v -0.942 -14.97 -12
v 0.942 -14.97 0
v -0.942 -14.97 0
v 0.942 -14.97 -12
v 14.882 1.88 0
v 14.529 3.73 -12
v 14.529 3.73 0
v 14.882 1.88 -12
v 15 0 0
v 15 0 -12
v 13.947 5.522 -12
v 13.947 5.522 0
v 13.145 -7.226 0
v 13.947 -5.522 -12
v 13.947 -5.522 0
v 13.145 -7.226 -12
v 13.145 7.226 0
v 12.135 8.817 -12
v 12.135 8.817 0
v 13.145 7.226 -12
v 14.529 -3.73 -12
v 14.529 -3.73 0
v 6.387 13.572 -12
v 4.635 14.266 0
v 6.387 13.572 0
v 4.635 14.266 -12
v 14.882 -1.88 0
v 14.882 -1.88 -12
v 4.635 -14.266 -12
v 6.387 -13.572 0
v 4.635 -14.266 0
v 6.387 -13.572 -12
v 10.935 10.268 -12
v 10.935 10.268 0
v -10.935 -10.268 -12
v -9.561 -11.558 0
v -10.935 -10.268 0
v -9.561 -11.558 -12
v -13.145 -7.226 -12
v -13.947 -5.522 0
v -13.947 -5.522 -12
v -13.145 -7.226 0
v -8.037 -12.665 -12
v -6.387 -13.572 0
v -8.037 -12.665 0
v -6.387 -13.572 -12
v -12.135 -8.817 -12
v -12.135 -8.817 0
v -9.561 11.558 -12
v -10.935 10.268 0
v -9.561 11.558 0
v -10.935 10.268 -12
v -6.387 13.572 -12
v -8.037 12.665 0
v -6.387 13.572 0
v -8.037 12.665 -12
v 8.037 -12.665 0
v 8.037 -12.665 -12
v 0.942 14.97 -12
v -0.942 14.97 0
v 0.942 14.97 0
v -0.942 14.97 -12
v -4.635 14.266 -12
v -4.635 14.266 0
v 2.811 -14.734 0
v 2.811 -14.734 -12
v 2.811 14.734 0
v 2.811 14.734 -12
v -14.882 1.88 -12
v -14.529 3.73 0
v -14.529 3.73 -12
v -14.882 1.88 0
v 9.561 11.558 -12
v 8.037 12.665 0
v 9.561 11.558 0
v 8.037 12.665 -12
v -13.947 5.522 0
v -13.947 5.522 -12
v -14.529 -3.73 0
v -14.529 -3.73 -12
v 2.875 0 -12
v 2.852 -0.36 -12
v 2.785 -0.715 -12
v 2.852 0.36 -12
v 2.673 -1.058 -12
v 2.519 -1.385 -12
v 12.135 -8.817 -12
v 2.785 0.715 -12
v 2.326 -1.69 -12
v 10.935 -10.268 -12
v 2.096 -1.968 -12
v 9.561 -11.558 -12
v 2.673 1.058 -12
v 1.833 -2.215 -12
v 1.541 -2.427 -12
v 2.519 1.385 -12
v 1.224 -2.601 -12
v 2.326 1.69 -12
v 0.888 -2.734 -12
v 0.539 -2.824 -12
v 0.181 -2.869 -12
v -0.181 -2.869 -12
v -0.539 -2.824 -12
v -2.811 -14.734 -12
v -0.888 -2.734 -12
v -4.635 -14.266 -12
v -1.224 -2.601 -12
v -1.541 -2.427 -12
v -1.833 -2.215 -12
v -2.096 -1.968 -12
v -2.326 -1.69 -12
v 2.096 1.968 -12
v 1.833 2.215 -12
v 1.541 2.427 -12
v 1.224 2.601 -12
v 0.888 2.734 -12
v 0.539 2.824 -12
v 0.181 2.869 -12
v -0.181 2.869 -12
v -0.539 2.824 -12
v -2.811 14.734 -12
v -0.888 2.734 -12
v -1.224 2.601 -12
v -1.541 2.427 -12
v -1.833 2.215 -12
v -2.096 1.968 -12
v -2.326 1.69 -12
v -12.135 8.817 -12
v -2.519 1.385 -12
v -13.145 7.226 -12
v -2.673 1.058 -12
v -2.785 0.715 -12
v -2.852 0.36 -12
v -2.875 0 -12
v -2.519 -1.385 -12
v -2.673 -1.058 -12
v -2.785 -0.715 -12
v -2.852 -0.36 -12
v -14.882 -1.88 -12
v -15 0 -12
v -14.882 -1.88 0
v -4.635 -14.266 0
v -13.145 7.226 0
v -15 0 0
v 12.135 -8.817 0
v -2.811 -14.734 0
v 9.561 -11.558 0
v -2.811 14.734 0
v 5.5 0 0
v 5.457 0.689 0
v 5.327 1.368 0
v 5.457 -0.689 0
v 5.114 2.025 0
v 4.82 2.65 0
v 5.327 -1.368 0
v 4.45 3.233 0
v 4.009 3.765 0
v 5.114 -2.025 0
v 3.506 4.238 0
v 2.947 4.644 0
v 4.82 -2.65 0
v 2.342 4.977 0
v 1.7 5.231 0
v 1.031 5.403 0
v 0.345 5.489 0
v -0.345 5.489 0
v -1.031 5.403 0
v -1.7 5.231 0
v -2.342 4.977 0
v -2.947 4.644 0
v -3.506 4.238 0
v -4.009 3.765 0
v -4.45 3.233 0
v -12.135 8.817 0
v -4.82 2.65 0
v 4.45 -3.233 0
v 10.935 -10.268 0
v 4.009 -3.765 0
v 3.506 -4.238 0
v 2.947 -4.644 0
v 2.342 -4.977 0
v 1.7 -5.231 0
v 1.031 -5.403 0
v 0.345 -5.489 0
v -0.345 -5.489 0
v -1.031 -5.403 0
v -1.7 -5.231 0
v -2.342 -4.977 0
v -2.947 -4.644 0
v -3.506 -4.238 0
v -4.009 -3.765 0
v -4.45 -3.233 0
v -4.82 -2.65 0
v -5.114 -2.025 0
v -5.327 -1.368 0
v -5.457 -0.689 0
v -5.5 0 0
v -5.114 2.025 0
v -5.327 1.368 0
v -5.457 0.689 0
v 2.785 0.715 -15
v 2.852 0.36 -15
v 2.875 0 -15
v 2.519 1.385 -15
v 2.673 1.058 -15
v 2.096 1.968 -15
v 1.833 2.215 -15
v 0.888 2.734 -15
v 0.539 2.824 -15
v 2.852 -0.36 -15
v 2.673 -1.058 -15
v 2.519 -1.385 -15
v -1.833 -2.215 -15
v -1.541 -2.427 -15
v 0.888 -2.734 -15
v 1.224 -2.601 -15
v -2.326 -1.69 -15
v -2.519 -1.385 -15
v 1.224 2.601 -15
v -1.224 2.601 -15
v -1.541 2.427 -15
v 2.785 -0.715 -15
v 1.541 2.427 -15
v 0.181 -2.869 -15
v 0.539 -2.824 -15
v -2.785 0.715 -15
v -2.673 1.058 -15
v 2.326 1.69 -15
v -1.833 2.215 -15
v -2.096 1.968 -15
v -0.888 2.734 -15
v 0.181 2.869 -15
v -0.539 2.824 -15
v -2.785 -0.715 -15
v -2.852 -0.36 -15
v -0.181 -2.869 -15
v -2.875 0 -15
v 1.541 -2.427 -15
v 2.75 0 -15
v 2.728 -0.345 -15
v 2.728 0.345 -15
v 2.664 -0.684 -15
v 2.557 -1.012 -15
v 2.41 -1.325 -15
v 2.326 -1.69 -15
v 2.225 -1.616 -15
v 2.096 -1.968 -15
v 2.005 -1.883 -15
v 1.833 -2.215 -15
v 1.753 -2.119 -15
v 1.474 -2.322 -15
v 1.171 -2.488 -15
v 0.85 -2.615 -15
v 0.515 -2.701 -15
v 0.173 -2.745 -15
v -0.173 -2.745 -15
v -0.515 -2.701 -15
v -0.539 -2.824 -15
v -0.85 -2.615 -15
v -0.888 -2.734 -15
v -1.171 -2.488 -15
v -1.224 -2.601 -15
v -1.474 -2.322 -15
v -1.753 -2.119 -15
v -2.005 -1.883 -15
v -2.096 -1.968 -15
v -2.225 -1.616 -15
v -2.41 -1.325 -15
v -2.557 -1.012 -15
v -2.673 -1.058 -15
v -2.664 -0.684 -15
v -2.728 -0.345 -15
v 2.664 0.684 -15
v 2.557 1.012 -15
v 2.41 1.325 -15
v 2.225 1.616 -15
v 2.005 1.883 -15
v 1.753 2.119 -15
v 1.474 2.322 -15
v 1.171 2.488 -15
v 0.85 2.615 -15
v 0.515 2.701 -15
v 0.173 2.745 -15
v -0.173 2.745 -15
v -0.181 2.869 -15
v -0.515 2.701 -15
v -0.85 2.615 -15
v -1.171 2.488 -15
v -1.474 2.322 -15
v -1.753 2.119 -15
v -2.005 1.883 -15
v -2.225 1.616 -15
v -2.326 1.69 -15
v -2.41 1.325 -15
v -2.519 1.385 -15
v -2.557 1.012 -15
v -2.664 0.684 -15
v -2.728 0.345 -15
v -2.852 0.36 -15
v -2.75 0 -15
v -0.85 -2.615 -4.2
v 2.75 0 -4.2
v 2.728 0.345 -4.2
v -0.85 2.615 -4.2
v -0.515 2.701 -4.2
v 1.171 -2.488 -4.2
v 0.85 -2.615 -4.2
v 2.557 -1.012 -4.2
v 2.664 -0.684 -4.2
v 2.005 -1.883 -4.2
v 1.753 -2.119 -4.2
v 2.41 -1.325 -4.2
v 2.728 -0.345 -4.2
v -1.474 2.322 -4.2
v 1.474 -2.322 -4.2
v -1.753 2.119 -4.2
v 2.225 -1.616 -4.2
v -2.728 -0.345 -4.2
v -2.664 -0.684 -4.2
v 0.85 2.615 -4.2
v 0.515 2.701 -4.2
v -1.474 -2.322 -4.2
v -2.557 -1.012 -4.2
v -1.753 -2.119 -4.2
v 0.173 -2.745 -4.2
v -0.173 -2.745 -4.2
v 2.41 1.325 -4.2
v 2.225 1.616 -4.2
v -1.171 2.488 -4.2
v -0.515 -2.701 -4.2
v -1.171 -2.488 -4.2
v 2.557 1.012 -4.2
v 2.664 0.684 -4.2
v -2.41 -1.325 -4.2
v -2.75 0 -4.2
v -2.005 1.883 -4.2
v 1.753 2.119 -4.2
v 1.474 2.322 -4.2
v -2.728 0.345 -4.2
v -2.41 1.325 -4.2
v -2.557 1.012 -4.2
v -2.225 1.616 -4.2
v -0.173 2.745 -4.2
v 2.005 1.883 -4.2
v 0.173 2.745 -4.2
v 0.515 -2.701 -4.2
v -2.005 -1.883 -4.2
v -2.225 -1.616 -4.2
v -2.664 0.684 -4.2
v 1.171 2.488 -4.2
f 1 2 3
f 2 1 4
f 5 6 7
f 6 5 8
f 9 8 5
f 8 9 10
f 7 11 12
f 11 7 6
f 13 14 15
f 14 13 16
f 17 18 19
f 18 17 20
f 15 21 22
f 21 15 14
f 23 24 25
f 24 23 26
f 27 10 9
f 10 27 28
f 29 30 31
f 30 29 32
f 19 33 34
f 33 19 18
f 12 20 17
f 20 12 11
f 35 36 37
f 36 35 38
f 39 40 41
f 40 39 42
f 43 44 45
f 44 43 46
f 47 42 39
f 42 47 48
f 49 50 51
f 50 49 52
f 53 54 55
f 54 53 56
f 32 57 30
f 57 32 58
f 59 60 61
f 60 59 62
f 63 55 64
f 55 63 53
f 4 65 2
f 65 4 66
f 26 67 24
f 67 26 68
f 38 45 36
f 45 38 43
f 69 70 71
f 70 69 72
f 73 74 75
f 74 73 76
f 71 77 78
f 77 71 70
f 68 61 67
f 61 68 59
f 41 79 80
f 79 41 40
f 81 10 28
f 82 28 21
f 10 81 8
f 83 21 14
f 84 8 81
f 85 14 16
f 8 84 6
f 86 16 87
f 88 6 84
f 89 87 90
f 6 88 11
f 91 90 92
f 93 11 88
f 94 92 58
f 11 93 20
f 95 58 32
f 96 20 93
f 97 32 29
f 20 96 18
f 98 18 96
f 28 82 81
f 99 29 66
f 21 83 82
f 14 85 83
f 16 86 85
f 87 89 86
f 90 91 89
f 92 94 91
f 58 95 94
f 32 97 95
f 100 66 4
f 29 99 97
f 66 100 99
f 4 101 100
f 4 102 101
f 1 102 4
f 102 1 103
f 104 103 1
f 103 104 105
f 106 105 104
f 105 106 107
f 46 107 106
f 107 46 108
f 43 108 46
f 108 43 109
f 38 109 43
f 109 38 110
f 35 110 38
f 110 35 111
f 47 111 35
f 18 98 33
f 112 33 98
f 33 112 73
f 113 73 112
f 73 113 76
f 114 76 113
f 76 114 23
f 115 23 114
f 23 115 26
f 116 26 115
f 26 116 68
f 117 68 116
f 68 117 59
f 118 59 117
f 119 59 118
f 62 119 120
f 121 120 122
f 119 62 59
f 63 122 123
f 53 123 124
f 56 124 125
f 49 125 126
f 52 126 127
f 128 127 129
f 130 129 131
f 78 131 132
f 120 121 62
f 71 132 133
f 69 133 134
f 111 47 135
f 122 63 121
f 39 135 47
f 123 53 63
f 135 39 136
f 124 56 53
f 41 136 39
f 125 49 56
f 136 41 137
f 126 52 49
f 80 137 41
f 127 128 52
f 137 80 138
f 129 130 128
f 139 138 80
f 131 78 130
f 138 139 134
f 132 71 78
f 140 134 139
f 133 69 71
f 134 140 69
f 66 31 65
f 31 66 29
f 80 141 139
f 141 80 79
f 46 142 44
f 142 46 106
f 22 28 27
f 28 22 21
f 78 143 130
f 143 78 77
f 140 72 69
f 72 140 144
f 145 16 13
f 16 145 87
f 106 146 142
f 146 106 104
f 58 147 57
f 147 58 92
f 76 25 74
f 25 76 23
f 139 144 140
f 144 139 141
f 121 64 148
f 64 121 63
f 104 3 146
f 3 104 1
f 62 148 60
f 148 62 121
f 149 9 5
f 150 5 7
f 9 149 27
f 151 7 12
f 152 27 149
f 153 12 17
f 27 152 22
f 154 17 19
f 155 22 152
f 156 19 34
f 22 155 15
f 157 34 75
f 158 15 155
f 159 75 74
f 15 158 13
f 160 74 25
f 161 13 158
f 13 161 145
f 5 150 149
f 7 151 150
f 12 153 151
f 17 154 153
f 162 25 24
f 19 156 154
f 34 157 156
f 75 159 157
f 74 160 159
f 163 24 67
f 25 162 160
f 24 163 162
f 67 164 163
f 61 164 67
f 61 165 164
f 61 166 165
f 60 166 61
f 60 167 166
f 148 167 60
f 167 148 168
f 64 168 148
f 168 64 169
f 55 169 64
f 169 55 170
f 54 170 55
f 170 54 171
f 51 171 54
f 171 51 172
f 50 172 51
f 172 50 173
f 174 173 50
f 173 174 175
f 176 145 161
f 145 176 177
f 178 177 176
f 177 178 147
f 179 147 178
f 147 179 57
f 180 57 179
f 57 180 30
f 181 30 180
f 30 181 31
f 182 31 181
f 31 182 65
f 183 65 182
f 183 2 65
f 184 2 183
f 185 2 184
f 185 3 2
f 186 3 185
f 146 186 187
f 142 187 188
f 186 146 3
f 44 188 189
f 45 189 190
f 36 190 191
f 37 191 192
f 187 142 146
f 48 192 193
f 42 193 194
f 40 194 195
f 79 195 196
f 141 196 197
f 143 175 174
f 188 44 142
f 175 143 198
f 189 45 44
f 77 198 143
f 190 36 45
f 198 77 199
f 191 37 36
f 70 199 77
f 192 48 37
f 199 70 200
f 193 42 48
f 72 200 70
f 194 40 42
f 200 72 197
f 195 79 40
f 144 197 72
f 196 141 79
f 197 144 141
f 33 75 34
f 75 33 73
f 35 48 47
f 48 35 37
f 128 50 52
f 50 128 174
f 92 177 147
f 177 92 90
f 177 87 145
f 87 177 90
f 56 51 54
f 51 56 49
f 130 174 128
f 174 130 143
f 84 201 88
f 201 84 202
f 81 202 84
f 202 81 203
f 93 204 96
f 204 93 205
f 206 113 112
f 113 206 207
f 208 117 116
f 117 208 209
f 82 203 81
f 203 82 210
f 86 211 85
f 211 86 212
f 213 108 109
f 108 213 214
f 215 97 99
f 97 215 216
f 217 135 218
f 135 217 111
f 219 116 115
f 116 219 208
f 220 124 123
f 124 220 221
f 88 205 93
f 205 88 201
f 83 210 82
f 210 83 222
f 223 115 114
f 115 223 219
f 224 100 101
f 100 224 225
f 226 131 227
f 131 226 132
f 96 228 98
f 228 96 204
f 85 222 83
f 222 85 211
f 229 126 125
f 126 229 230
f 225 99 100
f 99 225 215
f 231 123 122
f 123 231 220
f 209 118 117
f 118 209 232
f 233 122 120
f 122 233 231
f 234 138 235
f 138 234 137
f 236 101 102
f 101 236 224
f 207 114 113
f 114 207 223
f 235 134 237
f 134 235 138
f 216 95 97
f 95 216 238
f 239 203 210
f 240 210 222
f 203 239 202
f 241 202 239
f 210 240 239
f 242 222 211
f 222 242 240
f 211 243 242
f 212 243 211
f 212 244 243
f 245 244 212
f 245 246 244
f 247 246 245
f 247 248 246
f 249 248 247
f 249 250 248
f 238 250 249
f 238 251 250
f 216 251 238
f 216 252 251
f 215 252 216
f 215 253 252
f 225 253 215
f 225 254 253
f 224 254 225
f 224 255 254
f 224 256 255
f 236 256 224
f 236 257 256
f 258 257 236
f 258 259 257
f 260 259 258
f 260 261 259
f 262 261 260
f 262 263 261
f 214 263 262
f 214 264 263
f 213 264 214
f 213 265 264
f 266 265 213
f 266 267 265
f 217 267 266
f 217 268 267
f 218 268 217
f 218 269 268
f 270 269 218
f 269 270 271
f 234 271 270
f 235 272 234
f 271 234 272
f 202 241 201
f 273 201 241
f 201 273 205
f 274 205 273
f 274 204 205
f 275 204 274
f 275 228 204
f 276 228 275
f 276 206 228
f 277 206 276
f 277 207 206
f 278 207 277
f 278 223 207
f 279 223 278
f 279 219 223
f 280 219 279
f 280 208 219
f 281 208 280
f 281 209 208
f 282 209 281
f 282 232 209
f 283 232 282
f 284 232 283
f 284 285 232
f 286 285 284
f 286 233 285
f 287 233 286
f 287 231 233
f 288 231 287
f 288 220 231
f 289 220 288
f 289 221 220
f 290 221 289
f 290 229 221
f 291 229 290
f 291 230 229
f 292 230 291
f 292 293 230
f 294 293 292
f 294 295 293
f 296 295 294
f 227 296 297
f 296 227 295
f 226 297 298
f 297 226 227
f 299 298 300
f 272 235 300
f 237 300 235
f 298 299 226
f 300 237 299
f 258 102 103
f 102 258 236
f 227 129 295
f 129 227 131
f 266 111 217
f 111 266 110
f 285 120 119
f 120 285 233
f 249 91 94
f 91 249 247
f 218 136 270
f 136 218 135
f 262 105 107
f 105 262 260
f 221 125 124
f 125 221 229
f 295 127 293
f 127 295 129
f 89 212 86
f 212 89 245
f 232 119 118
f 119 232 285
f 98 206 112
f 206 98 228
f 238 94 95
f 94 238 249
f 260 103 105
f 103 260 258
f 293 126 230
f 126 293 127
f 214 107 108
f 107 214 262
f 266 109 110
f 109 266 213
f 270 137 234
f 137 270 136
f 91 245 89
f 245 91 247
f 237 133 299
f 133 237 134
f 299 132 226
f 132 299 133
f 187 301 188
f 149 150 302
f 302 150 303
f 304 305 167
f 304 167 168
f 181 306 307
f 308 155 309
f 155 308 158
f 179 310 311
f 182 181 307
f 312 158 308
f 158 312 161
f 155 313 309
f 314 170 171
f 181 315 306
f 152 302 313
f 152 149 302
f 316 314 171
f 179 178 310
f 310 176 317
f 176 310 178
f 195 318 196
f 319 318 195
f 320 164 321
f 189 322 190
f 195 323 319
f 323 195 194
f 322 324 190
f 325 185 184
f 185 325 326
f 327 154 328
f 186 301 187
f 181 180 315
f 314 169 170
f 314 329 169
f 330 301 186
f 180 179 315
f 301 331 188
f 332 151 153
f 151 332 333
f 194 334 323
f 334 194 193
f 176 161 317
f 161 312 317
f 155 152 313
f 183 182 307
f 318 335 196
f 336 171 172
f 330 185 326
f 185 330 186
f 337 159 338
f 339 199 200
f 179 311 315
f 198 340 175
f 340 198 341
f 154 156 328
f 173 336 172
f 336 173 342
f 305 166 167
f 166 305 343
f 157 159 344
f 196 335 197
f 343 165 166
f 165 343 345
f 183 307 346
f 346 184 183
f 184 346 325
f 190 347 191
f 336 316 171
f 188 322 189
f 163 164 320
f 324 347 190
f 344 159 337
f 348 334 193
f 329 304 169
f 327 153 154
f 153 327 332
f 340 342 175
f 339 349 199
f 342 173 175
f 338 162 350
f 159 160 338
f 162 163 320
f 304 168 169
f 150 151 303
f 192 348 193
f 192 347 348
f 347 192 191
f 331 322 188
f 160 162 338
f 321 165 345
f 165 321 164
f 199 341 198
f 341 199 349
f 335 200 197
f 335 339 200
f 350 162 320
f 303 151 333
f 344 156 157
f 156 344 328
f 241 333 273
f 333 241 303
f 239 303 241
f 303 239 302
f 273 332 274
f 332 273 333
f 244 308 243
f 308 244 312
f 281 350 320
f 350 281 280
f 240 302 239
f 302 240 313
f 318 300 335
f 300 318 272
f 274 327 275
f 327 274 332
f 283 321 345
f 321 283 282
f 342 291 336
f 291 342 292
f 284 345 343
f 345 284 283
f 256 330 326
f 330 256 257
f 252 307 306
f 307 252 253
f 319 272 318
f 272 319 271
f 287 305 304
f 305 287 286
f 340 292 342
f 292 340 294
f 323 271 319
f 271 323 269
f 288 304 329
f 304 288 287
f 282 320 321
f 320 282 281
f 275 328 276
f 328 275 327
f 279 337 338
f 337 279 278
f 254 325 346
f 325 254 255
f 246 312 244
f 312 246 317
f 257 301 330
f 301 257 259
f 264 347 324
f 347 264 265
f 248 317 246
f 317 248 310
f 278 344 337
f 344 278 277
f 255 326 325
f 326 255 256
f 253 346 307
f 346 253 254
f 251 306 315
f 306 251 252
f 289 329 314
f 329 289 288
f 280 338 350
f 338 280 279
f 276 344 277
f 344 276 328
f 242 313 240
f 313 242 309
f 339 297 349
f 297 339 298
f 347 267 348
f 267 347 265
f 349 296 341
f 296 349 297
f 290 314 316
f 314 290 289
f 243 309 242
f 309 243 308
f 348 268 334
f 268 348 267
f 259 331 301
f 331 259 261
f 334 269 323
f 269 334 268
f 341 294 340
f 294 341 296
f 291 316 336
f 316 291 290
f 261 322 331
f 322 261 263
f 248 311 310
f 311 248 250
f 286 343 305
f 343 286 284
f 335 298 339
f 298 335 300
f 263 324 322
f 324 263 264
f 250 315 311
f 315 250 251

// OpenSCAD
$fn = 50;


difference() {
	union() {
		translate(v = [0, 0, -12.0000000000]) {
			cylinder(h = 12, r = 15.0000000000);
		}
		#translate(v = [0, 0, -15.0000000000]) {
			cylinder(h = 15, r = 2.8750000000);
		}
	}
	union() {
		translate(v = [0, 0, 0]) {
			rotate(a = [0, 0, 0]) {
				difference() {
					union() {
						translate(v = [0, 0, -15.0000000000]) {
							cylinder(h = 15, r = 2.2500000000);
						}
						translate(v = [0, 0, -4.2000000000]) {
							cylinder(h = 4.2000000000, r1 = 2.7500000000, r2 = 5.5000000000);
						}
						translate(v = [0, 0, -15.0000000000]) {
							cylinder(h = 15, r = 2.7500000000);
						}
						translate(v = [0, 0, -15.0000000000]) {
							cylinder(h = 15, r = 2.2500000000);
						}
					}
					union();
				}
			}
		}
	}
}
